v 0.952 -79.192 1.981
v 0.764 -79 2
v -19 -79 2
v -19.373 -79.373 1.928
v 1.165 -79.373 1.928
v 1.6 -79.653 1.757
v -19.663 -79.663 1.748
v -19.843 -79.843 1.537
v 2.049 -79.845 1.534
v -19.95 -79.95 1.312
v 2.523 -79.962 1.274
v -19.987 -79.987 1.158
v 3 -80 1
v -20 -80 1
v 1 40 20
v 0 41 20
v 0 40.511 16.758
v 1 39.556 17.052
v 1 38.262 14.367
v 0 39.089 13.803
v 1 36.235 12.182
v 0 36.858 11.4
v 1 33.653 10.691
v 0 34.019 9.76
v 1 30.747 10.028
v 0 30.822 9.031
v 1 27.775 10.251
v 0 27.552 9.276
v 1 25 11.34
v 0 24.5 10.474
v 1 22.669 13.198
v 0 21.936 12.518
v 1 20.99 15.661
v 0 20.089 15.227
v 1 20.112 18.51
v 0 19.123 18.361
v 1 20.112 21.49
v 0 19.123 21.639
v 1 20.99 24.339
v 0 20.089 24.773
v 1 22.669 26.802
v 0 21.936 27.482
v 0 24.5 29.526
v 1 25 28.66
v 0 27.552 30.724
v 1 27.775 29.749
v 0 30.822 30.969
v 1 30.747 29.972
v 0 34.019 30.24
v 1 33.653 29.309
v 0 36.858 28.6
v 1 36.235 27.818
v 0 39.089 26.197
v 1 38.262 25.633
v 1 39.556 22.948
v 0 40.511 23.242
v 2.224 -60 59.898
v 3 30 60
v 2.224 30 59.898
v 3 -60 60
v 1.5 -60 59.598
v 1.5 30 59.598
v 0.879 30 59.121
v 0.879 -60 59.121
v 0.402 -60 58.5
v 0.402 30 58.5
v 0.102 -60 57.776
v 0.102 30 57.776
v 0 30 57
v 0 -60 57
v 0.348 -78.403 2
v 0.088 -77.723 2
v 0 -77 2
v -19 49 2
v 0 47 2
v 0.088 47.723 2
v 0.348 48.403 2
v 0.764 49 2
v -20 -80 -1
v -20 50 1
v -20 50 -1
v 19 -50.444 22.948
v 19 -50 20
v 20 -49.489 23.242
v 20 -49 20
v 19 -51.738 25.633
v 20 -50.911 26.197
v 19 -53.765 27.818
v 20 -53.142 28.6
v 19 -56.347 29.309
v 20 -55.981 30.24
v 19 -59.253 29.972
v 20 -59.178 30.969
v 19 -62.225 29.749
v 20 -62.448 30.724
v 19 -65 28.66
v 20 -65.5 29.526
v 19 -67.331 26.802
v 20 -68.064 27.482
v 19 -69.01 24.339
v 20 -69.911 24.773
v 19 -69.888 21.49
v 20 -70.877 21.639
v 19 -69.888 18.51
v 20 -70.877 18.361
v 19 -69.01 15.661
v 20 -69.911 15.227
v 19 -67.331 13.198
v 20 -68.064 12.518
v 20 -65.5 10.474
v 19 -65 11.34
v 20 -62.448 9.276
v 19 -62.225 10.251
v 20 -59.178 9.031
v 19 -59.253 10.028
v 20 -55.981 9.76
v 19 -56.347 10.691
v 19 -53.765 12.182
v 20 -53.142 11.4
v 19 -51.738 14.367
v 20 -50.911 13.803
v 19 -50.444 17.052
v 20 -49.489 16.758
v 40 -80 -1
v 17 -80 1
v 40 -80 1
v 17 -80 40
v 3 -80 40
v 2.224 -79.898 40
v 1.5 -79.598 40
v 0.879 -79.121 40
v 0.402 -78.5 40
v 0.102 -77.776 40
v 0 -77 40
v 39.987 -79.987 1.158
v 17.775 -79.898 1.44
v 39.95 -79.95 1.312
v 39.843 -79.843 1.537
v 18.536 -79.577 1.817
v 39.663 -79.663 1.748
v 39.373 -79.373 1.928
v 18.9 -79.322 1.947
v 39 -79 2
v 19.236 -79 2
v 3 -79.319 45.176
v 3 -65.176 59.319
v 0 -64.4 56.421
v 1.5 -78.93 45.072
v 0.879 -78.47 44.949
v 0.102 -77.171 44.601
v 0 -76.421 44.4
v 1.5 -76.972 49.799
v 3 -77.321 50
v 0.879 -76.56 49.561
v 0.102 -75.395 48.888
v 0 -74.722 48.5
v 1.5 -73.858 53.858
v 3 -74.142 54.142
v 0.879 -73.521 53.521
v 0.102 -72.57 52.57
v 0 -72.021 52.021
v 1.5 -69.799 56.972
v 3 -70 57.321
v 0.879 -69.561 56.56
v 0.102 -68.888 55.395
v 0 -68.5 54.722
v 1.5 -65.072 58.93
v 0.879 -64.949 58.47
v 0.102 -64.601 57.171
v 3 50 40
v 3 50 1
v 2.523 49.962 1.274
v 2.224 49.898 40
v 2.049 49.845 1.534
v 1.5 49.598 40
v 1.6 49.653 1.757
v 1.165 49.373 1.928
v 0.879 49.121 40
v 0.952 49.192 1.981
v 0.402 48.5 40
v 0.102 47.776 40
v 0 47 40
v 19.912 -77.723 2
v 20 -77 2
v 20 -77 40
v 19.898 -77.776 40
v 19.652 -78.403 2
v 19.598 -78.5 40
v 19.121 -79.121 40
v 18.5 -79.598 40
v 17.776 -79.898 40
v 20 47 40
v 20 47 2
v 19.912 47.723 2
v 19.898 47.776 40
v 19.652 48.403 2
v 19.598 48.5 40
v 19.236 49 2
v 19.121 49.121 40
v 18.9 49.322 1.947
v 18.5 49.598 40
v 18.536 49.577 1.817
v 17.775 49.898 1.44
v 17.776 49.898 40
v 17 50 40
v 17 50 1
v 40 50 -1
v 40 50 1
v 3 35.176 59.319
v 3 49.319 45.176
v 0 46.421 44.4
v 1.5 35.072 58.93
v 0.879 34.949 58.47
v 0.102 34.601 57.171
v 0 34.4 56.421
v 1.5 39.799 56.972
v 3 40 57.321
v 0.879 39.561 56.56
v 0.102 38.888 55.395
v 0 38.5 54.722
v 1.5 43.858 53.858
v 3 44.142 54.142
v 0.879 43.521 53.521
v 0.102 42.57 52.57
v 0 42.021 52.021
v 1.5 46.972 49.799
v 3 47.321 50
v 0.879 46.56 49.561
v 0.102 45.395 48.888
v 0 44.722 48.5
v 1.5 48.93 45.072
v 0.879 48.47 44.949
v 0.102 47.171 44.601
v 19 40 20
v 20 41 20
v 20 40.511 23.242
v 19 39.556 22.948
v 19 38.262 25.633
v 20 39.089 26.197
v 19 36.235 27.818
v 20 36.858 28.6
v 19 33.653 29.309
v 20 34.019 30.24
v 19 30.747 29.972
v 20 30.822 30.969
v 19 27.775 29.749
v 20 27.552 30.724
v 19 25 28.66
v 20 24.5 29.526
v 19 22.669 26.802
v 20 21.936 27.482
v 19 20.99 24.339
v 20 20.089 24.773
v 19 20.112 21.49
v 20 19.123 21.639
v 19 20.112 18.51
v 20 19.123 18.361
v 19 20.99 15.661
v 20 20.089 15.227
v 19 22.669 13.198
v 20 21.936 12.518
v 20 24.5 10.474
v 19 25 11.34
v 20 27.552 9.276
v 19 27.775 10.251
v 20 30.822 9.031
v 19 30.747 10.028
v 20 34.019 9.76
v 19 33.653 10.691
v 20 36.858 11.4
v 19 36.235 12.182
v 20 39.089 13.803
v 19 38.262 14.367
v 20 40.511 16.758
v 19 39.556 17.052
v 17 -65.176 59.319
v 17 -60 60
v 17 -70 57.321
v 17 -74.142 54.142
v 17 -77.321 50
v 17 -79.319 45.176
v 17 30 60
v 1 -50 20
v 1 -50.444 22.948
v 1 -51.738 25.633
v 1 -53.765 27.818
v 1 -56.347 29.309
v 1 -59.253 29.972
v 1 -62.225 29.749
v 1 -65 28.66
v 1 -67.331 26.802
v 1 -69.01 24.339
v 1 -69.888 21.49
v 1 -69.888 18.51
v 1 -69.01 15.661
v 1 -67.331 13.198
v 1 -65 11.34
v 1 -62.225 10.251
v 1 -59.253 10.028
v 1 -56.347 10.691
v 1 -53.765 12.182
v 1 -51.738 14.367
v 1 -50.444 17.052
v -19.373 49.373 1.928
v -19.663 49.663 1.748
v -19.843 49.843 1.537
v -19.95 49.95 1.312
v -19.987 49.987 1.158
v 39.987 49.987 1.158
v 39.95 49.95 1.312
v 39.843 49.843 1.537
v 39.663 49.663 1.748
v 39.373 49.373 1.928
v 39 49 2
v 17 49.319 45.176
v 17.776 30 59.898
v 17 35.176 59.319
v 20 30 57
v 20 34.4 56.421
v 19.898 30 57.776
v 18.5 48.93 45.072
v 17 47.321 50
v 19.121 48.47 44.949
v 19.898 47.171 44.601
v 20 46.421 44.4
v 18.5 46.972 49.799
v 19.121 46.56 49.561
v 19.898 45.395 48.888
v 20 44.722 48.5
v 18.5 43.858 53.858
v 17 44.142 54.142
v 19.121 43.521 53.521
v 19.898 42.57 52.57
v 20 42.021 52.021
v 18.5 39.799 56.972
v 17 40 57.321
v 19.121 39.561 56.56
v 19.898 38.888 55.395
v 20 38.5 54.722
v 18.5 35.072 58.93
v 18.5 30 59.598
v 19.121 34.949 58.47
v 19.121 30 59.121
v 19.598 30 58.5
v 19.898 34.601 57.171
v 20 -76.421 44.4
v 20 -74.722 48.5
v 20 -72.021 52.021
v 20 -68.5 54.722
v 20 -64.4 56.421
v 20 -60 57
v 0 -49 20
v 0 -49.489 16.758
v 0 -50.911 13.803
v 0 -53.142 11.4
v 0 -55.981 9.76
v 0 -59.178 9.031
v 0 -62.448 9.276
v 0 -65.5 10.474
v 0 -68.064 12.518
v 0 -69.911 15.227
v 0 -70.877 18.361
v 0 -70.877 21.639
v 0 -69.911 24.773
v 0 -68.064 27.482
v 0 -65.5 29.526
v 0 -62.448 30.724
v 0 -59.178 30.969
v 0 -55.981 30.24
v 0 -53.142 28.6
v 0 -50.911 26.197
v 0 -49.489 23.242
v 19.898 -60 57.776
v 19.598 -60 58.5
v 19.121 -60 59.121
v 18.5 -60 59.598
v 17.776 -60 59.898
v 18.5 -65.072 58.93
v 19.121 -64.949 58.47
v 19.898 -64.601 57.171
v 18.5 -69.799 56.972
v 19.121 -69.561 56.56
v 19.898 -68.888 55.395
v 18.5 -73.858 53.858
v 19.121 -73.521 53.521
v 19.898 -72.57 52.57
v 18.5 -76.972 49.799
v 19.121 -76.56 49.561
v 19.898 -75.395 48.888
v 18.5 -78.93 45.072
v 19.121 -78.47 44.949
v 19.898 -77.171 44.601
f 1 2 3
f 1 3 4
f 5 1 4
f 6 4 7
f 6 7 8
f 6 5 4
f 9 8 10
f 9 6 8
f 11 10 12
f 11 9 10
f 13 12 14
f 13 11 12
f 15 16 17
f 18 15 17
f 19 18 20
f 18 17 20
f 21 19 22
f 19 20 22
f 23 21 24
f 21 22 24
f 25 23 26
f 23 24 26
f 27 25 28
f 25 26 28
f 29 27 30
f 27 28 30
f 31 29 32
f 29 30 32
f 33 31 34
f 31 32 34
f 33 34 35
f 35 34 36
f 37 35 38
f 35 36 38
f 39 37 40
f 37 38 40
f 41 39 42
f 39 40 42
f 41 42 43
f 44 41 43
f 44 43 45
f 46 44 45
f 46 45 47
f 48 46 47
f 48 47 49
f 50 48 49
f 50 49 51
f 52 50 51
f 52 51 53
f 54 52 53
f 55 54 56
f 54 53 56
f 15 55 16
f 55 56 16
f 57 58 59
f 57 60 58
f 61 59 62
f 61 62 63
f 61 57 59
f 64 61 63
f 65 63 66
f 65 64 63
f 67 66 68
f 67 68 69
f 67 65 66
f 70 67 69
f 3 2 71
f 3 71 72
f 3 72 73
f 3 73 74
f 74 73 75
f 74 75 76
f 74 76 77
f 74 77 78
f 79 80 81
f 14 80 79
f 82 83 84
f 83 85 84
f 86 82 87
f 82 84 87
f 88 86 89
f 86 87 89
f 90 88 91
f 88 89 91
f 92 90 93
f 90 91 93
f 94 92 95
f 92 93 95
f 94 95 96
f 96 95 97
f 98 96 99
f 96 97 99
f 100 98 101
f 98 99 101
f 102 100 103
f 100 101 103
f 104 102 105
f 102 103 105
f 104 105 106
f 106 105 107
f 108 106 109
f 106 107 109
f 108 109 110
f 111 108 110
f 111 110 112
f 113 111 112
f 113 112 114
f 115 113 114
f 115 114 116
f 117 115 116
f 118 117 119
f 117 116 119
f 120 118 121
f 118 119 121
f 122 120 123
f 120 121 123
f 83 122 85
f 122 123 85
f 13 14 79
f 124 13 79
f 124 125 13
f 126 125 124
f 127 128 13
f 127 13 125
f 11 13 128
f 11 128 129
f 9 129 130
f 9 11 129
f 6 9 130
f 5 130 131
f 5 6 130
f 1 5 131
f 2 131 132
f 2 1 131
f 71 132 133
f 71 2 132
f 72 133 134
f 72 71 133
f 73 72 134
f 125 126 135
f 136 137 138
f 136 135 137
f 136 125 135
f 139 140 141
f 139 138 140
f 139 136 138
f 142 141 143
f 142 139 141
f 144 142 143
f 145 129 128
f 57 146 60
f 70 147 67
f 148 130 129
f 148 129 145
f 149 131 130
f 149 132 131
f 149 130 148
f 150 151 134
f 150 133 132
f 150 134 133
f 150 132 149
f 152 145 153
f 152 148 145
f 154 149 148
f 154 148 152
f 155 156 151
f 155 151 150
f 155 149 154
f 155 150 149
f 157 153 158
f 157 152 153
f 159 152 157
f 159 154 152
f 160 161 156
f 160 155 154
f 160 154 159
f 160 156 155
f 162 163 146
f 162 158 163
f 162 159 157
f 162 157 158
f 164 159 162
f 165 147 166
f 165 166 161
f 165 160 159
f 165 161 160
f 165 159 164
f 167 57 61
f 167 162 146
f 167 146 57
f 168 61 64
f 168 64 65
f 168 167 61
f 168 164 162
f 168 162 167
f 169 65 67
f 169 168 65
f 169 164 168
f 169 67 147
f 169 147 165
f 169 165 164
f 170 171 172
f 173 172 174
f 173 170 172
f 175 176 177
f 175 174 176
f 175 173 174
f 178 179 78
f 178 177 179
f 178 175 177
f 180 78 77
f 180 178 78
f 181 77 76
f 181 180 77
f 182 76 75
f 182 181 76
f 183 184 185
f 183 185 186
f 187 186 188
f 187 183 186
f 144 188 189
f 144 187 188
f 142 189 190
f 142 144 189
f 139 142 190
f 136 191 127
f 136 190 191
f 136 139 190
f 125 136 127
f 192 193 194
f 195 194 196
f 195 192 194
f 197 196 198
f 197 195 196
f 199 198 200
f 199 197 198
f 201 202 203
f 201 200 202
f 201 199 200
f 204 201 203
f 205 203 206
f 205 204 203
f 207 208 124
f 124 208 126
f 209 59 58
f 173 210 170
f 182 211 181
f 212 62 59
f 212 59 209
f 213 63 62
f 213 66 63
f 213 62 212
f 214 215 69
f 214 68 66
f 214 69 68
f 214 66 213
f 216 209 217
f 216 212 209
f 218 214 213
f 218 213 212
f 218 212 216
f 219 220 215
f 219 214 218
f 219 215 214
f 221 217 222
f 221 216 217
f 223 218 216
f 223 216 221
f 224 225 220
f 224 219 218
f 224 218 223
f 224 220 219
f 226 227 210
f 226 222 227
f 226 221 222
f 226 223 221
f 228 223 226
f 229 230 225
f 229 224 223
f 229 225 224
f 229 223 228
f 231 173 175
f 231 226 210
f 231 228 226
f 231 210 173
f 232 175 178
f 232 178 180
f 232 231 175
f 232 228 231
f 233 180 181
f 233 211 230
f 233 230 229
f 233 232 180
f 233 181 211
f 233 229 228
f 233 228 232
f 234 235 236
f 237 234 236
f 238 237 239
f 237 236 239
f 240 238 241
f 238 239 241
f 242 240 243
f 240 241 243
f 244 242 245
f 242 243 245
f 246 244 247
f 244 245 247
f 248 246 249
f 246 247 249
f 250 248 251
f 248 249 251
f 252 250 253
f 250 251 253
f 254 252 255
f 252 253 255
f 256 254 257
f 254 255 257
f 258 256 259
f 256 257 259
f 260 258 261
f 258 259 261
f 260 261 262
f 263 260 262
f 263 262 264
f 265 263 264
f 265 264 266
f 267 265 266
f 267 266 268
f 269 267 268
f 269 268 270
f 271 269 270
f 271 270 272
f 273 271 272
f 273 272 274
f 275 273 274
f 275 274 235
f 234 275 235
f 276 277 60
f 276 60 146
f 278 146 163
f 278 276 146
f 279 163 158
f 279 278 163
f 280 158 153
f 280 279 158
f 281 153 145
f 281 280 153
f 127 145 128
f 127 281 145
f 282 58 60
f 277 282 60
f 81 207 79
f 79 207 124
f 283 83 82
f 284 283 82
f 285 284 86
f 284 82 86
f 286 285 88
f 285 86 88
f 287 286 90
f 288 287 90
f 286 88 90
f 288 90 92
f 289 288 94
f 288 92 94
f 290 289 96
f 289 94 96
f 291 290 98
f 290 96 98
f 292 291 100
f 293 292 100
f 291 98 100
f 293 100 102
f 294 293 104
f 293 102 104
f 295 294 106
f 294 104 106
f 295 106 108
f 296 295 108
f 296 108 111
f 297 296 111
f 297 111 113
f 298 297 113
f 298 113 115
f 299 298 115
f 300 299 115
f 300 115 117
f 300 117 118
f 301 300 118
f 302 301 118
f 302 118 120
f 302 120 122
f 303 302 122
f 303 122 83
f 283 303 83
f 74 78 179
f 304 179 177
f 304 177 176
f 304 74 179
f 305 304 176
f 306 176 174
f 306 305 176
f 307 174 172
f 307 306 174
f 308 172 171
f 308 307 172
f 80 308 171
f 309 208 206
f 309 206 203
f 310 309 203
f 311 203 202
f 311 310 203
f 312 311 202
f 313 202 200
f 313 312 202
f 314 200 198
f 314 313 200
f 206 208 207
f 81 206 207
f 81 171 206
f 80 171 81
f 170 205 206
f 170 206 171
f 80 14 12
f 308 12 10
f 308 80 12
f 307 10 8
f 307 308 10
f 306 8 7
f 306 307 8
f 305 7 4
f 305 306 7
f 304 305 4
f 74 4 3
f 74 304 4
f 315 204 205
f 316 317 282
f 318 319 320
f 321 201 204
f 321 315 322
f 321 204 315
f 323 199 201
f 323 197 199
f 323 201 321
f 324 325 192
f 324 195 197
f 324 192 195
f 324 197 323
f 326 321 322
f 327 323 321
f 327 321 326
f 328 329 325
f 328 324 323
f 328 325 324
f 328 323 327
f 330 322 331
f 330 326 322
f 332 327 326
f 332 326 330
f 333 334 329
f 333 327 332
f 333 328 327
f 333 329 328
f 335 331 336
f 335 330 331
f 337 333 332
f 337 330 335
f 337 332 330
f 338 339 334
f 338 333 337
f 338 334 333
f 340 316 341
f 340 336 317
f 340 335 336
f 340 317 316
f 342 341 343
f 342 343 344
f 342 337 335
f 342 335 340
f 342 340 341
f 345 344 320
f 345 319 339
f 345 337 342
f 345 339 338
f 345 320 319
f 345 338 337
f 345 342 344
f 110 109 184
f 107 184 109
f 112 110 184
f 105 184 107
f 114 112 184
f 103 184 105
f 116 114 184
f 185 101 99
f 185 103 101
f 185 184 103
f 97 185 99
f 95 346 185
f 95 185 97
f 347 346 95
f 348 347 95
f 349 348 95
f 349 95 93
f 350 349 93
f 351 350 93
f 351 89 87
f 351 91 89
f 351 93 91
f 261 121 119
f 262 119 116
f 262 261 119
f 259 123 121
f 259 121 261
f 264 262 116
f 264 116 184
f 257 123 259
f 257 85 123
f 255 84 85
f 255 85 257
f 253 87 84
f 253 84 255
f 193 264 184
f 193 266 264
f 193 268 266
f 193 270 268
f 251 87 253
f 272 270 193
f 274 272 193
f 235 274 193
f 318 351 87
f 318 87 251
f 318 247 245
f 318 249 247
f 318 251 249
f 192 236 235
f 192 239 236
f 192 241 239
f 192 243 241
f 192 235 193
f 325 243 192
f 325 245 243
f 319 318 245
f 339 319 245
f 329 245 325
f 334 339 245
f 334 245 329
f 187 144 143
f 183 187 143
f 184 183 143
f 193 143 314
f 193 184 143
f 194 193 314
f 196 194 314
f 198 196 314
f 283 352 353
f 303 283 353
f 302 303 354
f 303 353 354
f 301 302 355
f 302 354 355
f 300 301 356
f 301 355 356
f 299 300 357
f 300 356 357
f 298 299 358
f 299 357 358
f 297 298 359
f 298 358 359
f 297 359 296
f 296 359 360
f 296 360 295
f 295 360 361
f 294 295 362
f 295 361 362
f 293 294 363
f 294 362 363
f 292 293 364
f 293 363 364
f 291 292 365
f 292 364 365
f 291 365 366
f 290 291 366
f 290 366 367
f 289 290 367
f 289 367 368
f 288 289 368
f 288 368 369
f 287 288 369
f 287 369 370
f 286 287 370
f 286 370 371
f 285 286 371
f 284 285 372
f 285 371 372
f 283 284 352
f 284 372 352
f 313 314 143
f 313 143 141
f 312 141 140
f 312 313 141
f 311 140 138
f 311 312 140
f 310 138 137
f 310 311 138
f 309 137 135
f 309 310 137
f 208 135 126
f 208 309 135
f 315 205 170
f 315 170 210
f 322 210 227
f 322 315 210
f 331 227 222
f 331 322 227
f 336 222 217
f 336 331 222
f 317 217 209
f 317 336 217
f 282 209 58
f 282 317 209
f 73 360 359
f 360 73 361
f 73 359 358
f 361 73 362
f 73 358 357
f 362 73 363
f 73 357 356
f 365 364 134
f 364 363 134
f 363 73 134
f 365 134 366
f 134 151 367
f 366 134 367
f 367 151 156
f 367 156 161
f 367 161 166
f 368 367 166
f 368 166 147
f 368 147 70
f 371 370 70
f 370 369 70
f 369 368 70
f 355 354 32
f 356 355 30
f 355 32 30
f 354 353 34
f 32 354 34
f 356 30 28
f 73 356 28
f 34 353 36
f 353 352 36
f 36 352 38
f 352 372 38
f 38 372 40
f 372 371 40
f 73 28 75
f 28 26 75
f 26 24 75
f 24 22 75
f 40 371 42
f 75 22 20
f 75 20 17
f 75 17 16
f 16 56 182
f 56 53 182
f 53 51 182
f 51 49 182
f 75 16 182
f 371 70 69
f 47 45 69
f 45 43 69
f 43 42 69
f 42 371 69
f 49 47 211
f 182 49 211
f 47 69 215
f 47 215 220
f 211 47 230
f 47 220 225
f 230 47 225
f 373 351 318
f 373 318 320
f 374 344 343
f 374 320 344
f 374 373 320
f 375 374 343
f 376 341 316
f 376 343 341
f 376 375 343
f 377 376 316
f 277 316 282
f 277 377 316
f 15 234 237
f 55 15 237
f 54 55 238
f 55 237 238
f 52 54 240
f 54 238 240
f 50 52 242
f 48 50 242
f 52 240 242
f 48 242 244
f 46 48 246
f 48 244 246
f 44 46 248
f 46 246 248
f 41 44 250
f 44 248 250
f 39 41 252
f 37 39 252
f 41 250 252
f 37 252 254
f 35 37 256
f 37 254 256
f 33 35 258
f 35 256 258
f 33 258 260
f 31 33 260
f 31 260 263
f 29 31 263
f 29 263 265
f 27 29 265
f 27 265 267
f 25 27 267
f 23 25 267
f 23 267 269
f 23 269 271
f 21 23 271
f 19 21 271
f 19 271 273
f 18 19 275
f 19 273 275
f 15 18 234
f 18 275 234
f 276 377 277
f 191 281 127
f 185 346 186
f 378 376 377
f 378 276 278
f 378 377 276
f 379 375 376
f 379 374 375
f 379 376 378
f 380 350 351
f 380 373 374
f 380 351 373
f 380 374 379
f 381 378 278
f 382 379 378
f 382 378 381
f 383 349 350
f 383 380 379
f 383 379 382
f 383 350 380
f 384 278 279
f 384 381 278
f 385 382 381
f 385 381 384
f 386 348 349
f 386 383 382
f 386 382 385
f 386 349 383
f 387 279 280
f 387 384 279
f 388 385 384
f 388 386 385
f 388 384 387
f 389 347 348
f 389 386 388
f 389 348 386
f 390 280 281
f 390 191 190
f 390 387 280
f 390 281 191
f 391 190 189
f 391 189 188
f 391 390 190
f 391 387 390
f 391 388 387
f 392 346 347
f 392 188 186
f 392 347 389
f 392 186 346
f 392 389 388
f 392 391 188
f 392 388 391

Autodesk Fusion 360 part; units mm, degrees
sketch "Sketch1" plane through (0, 0, 0) normal (1, 0, 0) x (0, 1, 0)
  line L0 (-80, 0) -> (50, 0)
  line L1 (50, 0) -> (50, 60)
  line L2 (50, 60) -> (-80, 60)
  line L3 (-80, 60) -> (-80, 0)
  dimension "d1" = 130
  dimension "d2" = 60
extrude "Extrude1" add sketch "Sketch1" along normal blind 20
fillet "Fillet1" radius 20 2 edges at (10, -80, 60) (10, 50, 60)
sketch "Sketch2" plane through (20, 0, 0) normal (1, 0, 0) x (0, 1, 0)
  circle A0 centre (-60, 20) radius 10
  circle A1 centre (30, 20) radius 10
  arc A2 (50, 40) -> (30, 60) centre (30, 40) ccw
  line L0 (30, 60) -> (-60, 60)
  arc A3 (-60, 60) -> (-80, 40) centre (-60, 40) ccw
  line L1 (-80, 40) -> (-80, 0)
  line L2 (-80, 0) -> (50, 0)
  line L3 (50, 0) -> (50, 40)
  dimension "d11" = 20
  dimension "d14" = 90
  dimension "d15" = 0
extrude "Extrude2" cut sketch "Sketch2" against normal blind 20 contours A0 | A1
chamfer "Chamfer1" distance 1 angle 45 4 edges at (20, -69.3233, 23.6162) (20, 20.6767, 23.6162) (0, 20.6767, 16.3838) (0, -69.3233, 16.3838)
sketch "Sketch3" plane through (0, 0, 0) normal (-1, 0, 0) x (0, -1, 0)
  circle A0 centre (-30, 20) radius 11
  arc A1 (-30, 60) -> (-50, 40) centre (-30, 40) ccw
  line L0 (-50, 40) -> (-50, 0)
  line L1 (-50, 0) -> (80, 0)
  line L2 (80, 0) -> (80, 40)
  arc A2 (80, 40) -> (60, 60) centre (60, 40) ccw
  line L3 (60, 60) -> (-30, 60)
  circle A3 centre (60, 20) radius 11
  line L4 (-50, 0) -> (80, 0)
  line L5 (80, 0) -> (80, 2)
  line L6 (80, 2) -> (-50, 2)
  line L7 (-50, 2) -> (-50, 0)
  dimension "d19" = 2
extrude "Extrude3" add sketch "Sketch3" along normal blind 20 contours L0 L1 L2 L4 L5 L6 L7
extrude "Extrude4" add 1 faces at (-20, 6.6667, 0.6667) along direction (1, 0, 0) blind 60
fillet "Fillet4" radius 3 10 edges at (20, 50, 21) (20, 44.1421, 54.1421) (20, -15, 60) (20, -74.1421, 54.1421) (20, -80, 21) (0, 50, 21) (0, 44.1421, 54.1421) (0, -15, 60) (0, -74.1421, 54.1421) (0, -80, 21)
fillet "Fillet5" radius 1 6 edges at (40, -15, 2) (28.5, 50, 2) (28.5, -80, 2) (-8.5, 50, 2) (-20, -15, 2) (-8.5, -80, 2)
extrude "Extrude5" add 1 faces at (0, 6.6667, 0) along direction (0, 0, -1) blind 1
